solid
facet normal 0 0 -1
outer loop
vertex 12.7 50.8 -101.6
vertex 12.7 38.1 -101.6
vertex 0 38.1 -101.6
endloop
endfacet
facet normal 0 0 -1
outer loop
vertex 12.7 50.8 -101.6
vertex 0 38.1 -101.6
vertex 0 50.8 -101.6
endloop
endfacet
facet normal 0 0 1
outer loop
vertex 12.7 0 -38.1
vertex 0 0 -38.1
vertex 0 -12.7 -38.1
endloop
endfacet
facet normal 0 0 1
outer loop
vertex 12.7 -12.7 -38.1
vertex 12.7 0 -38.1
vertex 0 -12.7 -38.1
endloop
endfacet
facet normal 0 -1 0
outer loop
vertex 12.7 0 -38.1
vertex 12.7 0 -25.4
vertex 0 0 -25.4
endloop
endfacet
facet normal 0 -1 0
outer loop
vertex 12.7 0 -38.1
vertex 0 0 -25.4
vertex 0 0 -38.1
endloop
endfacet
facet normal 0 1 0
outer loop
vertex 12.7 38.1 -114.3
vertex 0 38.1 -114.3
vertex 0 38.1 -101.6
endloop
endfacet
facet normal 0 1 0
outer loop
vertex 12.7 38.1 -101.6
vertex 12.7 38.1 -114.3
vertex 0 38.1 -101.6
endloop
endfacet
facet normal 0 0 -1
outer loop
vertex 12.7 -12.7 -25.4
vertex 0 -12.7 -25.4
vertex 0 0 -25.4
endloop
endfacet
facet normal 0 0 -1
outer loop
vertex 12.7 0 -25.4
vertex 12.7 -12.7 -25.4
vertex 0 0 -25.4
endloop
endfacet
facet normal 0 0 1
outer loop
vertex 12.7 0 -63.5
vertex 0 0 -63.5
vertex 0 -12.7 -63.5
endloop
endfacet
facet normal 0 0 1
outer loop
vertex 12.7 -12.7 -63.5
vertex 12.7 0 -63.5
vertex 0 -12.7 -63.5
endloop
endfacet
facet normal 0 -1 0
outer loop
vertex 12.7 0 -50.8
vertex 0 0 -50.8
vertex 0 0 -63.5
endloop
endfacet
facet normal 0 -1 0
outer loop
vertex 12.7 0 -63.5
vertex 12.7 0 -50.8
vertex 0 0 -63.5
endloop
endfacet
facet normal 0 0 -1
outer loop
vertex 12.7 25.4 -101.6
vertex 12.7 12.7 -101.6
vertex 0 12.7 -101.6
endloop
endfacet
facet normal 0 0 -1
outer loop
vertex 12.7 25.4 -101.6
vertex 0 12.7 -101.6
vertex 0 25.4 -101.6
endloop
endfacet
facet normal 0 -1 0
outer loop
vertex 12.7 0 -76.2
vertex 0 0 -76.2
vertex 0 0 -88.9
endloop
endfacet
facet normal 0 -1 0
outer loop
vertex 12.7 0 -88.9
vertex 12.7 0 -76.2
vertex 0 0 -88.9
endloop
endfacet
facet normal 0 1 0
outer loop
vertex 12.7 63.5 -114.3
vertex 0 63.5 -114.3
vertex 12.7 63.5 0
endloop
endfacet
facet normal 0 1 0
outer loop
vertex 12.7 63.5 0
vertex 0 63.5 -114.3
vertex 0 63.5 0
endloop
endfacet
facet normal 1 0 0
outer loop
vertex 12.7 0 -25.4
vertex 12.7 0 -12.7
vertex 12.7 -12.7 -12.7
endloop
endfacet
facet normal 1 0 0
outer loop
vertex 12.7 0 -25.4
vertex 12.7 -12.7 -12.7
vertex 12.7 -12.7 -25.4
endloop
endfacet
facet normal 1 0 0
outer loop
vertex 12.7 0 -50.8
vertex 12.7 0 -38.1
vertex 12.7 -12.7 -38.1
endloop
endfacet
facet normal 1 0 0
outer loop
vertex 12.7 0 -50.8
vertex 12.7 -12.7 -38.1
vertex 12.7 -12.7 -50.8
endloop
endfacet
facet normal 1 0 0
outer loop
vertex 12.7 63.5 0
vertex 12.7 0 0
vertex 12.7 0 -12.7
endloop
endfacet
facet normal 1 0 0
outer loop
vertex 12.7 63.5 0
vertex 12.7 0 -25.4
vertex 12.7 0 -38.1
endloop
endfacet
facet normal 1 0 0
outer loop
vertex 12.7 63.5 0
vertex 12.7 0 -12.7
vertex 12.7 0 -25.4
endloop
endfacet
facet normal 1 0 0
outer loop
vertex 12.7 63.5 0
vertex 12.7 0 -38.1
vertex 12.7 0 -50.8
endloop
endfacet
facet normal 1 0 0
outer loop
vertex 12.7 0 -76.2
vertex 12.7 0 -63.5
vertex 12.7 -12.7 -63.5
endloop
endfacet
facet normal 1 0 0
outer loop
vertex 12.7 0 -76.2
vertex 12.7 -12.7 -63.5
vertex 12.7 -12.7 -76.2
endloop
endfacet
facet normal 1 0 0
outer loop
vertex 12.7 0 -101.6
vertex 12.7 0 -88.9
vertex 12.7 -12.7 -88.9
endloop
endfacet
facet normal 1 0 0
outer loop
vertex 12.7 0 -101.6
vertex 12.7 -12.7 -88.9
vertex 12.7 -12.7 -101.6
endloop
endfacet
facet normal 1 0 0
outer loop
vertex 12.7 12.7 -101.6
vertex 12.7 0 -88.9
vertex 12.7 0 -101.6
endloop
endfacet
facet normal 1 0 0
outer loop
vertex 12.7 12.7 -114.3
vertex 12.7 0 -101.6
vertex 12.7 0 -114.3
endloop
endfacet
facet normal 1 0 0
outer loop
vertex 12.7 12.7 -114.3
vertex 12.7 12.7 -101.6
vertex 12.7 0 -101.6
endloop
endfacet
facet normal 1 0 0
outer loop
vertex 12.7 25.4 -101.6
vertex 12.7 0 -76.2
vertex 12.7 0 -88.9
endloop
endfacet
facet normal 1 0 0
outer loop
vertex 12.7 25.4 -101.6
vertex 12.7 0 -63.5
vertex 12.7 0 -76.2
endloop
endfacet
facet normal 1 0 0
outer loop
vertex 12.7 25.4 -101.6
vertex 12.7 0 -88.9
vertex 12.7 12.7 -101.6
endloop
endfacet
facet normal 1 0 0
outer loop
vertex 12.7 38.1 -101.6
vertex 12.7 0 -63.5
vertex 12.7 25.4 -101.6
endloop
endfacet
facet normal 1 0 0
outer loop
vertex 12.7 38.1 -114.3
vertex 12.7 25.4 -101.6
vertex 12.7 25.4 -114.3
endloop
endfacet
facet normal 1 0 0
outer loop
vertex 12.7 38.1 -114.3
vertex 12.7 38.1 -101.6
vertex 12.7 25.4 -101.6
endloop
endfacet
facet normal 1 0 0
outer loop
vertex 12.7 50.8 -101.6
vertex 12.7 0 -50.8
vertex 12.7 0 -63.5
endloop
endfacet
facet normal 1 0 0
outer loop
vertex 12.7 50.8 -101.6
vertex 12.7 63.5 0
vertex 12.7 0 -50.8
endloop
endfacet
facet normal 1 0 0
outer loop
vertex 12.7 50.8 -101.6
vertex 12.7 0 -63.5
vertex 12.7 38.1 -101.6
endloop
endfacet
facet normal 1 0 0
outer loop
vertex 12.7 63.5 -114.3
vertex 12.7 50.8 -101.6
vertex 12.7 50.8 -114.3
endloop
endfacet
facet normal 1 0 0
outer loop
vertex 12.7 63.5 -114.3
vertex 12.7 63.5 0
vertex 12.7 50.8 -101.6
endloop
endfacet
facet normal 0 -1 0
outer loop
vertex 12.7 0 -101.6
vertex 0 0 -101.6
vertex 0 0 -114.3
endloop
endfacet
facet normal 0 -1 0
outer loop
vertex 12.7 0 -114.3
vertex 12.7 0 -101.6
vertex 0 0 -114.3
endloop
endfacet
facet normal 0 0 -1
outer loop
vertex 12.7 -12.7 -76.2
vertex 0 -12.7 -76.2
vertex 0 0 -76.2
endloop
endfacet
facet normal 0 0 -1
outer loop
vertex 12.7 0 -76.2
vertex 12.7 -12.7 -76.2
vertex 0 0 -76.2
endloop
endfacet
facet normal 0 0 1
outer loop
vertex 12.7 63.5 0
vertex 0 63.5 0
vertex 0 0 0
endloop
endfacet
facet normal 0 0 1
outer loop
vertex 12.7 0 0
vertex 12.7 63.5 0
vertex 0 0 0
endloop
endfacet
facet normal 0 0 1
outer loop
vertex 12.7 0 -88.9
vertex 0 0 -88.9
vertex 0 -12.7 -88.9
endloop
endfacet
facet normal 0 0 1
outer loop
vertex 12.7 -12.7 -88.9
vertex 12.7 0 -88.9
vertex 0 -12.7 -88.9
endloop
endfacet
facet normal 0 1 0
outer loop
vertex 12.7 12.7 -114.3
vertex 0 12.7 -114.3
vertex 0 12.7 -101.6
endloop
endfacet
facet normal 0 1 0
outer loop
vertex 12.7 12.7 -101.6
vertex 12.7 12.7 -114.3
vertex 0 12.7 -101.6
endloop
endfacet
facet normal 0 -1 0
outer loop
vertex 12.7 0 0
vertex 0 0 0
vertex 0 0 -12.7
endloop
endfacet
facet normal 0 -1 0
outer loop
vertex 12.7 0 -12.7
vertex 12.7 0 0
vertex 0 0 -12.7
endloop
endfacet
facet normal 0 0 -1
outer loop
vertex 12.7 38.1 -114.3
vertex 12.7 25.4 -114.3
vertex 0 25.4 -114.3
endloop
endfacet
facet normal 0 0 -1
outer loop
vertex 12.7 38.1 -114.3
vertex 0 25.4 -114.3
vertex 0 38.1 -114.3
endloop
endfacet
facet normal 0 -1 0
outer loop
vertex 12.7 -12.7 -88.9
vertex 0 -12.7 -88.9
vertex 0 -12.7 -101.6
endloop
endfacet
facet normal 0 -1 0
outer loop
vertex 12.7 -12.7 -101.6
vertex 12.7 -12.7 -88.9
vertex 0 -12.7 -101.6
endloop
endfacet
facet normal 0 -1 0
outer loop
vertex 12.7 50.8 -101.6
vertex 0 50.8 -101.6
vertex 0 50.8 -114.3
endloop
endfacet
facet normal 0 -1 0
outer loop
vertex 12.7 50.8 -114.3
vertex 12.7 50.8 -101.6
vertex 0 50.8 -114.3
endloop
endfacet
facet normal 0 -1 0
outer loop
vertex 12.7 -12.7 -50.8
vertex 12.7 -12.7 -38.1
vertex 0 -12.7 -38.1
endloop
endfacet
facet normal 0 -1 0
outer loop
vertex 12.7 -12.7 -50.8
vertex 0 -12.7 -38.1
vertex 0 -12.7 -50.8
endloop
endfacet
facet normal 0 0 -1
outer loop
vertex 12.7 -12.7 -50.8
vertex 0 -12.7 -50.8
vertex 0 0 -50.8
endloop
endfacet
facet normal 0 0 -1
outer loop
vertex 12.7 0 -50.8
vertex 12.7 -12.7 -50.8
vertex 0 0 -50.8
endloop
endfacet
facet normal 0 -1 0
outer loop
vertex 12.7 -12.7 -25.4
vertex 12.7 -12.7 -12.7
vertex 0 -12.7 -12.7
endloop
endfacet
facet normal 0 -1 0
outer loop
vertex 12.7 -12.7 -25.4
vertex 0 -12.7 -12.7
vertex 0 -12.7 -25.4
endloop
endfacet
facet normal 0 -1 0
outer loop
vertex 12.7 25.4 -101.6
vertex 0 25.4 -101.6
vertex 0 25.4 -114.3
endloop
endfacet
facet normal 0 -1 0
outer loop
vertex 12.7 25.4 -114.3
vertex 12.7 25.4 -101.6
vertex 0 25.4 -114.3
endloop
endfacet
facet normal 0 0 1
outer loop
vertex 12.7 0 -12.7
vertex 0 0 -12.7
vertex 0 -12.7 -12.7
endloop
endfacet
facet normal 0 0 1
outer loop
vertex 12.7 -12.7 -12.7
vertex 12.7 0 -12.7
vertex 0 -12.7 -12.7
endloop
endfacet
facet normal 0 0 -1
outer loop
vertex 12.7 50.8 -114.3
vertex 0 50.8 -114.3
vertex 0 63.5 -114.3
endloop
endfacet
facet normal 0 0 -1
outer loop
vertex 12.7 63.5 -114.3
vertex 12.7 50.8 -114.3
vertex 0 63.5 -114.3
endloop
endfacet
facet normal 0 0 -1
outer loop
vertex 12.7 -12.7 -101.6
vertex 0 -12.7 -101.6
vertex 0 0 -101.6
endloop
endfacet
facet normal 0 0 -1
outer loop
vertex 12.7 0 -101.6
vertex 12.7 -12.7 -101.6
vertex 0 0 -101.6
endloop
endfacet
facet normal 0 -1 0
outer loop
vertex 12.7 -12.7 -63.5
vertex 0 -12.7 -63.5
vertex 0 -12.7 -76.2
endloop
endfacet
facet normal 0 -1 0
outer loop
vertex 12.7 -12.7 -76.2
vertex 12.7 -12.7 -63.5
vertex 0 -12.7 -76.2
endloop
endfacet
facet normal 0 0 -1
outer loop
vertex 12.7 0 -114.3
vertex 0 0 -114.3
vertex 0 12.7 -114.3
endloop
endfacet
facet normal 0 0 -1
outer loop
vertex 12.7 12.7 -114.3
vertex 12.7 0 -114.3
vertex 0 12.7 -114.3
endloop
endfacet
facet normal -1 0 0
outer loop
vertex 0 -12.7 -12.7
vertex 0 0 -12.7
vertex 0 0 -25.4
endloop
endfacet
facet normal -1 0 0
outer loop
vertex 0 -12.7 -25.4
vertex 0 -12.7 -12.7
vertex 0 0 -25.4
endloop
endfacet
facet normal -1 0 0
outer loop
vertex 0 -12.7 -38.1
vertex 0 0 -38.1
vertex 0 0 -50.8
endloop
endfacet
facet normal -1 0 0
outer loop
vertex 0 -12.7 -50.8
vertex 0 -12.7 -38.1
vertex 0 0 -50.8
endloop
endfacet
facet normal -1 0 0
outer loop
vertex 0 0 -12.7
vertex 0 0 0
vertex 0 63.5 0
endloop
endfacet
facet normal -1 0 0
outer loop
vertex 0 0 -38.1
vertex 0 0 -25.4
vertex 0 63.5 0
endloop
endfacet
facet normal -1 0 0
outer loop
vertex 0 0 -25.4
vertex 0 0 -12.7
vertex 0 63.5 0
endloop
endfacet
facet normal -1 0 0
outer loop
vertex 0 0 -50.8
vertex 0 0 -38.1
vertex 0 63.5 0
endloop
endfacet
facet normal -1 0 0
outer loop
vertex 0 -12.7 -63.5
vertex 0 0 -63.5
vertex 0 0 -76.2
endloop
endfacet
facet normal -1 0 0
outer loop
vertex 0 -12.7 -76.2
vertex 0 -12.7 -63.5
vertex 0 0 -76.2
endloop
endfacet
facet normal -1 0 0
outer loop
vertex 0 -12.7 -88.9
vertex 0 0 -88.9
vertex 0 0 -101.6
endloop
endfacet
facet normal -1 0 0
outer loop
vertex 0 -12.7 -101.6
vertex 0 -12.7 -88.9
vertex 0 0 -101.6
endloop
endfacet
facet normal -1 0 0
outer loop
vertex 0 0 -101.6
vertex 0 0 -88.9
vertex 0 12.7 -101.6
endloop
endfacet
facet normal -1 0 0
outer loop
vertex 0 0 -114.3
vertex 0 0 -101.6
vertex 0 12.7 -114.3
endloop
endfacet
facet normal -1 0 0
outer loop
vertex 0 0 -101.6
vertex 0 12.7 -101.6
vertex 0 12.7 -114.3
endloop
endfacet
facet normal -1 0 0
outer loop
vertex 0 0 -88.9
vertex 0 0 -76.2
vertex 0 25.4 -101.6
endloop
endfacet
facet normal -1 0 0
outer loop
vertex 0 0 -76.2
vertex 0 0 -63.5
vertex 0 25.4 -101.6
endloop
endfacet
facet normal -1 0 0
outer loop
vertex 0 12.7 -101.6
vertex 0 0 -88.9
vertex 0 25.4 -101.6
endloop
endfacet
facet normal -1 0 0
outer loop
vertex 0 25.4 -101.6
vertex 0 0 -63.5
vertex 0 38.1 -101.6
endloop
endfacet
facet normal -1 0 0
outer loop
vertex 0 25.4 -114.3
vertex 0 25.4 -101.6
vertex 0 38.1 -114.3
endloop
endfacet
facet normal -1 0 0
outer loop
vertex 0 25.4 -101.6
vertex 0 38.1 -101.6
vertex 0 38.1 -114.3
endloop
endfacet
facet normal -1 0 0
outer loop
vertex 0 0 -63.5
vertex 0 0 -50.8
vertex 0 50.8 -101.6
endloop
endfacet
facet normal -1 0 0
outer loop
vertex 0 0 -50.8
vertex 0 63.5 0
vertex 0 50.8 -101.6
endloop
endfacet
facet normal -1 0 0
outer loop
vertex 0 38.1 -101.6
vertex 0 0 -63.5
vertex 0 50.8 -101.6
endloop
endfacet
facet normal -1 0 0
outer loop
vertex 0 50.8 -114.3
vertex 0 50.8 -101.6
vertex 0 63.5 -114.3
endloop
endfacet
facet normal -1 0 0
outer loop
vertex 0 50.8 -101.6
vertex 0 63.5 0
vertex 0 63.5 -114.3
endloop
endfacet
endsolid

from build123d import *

# Parameters (mm, degrees)
BOSS_EXTRUDE1_DEPTH = 12.7


with BuildPart() as part:
    # Sketch1 → Boss-Extrude1 (new body)
    with BuildSketch(Plane(origin=(0, 0, 0), x_dir=(0, 0, -1), z_dir=(1, 0, 0))):
        Polygon((0, 0), (12.7, 0), (12.7, -12.7), (25.4, -12.7), (25.4, 0), (38.1, 0), (38.1, -12.7), (50.8, -12.7), (50.8, 0), (63.5, 0), (63.5, -12.7), (76.2, -12.7), (76.2, 0), (88.9, 0), (88.9, -12.7), (101.6, -12.7), (101.6, 0), (114.3, 0), (114.3, 12.7), (101.6, 12.7), (101.6, 25.4), (114.3, 25.4), (114.3, 38.1), (101.6, 38.1), (101.6, 50.8), (114.3, 50.8), (114.3, 63.5), (101.6, 63.5), (0, 63.5), align=None)
    extrude(amount=BOSS_EXTRUDE1_DEPTH)


solid = part.part
